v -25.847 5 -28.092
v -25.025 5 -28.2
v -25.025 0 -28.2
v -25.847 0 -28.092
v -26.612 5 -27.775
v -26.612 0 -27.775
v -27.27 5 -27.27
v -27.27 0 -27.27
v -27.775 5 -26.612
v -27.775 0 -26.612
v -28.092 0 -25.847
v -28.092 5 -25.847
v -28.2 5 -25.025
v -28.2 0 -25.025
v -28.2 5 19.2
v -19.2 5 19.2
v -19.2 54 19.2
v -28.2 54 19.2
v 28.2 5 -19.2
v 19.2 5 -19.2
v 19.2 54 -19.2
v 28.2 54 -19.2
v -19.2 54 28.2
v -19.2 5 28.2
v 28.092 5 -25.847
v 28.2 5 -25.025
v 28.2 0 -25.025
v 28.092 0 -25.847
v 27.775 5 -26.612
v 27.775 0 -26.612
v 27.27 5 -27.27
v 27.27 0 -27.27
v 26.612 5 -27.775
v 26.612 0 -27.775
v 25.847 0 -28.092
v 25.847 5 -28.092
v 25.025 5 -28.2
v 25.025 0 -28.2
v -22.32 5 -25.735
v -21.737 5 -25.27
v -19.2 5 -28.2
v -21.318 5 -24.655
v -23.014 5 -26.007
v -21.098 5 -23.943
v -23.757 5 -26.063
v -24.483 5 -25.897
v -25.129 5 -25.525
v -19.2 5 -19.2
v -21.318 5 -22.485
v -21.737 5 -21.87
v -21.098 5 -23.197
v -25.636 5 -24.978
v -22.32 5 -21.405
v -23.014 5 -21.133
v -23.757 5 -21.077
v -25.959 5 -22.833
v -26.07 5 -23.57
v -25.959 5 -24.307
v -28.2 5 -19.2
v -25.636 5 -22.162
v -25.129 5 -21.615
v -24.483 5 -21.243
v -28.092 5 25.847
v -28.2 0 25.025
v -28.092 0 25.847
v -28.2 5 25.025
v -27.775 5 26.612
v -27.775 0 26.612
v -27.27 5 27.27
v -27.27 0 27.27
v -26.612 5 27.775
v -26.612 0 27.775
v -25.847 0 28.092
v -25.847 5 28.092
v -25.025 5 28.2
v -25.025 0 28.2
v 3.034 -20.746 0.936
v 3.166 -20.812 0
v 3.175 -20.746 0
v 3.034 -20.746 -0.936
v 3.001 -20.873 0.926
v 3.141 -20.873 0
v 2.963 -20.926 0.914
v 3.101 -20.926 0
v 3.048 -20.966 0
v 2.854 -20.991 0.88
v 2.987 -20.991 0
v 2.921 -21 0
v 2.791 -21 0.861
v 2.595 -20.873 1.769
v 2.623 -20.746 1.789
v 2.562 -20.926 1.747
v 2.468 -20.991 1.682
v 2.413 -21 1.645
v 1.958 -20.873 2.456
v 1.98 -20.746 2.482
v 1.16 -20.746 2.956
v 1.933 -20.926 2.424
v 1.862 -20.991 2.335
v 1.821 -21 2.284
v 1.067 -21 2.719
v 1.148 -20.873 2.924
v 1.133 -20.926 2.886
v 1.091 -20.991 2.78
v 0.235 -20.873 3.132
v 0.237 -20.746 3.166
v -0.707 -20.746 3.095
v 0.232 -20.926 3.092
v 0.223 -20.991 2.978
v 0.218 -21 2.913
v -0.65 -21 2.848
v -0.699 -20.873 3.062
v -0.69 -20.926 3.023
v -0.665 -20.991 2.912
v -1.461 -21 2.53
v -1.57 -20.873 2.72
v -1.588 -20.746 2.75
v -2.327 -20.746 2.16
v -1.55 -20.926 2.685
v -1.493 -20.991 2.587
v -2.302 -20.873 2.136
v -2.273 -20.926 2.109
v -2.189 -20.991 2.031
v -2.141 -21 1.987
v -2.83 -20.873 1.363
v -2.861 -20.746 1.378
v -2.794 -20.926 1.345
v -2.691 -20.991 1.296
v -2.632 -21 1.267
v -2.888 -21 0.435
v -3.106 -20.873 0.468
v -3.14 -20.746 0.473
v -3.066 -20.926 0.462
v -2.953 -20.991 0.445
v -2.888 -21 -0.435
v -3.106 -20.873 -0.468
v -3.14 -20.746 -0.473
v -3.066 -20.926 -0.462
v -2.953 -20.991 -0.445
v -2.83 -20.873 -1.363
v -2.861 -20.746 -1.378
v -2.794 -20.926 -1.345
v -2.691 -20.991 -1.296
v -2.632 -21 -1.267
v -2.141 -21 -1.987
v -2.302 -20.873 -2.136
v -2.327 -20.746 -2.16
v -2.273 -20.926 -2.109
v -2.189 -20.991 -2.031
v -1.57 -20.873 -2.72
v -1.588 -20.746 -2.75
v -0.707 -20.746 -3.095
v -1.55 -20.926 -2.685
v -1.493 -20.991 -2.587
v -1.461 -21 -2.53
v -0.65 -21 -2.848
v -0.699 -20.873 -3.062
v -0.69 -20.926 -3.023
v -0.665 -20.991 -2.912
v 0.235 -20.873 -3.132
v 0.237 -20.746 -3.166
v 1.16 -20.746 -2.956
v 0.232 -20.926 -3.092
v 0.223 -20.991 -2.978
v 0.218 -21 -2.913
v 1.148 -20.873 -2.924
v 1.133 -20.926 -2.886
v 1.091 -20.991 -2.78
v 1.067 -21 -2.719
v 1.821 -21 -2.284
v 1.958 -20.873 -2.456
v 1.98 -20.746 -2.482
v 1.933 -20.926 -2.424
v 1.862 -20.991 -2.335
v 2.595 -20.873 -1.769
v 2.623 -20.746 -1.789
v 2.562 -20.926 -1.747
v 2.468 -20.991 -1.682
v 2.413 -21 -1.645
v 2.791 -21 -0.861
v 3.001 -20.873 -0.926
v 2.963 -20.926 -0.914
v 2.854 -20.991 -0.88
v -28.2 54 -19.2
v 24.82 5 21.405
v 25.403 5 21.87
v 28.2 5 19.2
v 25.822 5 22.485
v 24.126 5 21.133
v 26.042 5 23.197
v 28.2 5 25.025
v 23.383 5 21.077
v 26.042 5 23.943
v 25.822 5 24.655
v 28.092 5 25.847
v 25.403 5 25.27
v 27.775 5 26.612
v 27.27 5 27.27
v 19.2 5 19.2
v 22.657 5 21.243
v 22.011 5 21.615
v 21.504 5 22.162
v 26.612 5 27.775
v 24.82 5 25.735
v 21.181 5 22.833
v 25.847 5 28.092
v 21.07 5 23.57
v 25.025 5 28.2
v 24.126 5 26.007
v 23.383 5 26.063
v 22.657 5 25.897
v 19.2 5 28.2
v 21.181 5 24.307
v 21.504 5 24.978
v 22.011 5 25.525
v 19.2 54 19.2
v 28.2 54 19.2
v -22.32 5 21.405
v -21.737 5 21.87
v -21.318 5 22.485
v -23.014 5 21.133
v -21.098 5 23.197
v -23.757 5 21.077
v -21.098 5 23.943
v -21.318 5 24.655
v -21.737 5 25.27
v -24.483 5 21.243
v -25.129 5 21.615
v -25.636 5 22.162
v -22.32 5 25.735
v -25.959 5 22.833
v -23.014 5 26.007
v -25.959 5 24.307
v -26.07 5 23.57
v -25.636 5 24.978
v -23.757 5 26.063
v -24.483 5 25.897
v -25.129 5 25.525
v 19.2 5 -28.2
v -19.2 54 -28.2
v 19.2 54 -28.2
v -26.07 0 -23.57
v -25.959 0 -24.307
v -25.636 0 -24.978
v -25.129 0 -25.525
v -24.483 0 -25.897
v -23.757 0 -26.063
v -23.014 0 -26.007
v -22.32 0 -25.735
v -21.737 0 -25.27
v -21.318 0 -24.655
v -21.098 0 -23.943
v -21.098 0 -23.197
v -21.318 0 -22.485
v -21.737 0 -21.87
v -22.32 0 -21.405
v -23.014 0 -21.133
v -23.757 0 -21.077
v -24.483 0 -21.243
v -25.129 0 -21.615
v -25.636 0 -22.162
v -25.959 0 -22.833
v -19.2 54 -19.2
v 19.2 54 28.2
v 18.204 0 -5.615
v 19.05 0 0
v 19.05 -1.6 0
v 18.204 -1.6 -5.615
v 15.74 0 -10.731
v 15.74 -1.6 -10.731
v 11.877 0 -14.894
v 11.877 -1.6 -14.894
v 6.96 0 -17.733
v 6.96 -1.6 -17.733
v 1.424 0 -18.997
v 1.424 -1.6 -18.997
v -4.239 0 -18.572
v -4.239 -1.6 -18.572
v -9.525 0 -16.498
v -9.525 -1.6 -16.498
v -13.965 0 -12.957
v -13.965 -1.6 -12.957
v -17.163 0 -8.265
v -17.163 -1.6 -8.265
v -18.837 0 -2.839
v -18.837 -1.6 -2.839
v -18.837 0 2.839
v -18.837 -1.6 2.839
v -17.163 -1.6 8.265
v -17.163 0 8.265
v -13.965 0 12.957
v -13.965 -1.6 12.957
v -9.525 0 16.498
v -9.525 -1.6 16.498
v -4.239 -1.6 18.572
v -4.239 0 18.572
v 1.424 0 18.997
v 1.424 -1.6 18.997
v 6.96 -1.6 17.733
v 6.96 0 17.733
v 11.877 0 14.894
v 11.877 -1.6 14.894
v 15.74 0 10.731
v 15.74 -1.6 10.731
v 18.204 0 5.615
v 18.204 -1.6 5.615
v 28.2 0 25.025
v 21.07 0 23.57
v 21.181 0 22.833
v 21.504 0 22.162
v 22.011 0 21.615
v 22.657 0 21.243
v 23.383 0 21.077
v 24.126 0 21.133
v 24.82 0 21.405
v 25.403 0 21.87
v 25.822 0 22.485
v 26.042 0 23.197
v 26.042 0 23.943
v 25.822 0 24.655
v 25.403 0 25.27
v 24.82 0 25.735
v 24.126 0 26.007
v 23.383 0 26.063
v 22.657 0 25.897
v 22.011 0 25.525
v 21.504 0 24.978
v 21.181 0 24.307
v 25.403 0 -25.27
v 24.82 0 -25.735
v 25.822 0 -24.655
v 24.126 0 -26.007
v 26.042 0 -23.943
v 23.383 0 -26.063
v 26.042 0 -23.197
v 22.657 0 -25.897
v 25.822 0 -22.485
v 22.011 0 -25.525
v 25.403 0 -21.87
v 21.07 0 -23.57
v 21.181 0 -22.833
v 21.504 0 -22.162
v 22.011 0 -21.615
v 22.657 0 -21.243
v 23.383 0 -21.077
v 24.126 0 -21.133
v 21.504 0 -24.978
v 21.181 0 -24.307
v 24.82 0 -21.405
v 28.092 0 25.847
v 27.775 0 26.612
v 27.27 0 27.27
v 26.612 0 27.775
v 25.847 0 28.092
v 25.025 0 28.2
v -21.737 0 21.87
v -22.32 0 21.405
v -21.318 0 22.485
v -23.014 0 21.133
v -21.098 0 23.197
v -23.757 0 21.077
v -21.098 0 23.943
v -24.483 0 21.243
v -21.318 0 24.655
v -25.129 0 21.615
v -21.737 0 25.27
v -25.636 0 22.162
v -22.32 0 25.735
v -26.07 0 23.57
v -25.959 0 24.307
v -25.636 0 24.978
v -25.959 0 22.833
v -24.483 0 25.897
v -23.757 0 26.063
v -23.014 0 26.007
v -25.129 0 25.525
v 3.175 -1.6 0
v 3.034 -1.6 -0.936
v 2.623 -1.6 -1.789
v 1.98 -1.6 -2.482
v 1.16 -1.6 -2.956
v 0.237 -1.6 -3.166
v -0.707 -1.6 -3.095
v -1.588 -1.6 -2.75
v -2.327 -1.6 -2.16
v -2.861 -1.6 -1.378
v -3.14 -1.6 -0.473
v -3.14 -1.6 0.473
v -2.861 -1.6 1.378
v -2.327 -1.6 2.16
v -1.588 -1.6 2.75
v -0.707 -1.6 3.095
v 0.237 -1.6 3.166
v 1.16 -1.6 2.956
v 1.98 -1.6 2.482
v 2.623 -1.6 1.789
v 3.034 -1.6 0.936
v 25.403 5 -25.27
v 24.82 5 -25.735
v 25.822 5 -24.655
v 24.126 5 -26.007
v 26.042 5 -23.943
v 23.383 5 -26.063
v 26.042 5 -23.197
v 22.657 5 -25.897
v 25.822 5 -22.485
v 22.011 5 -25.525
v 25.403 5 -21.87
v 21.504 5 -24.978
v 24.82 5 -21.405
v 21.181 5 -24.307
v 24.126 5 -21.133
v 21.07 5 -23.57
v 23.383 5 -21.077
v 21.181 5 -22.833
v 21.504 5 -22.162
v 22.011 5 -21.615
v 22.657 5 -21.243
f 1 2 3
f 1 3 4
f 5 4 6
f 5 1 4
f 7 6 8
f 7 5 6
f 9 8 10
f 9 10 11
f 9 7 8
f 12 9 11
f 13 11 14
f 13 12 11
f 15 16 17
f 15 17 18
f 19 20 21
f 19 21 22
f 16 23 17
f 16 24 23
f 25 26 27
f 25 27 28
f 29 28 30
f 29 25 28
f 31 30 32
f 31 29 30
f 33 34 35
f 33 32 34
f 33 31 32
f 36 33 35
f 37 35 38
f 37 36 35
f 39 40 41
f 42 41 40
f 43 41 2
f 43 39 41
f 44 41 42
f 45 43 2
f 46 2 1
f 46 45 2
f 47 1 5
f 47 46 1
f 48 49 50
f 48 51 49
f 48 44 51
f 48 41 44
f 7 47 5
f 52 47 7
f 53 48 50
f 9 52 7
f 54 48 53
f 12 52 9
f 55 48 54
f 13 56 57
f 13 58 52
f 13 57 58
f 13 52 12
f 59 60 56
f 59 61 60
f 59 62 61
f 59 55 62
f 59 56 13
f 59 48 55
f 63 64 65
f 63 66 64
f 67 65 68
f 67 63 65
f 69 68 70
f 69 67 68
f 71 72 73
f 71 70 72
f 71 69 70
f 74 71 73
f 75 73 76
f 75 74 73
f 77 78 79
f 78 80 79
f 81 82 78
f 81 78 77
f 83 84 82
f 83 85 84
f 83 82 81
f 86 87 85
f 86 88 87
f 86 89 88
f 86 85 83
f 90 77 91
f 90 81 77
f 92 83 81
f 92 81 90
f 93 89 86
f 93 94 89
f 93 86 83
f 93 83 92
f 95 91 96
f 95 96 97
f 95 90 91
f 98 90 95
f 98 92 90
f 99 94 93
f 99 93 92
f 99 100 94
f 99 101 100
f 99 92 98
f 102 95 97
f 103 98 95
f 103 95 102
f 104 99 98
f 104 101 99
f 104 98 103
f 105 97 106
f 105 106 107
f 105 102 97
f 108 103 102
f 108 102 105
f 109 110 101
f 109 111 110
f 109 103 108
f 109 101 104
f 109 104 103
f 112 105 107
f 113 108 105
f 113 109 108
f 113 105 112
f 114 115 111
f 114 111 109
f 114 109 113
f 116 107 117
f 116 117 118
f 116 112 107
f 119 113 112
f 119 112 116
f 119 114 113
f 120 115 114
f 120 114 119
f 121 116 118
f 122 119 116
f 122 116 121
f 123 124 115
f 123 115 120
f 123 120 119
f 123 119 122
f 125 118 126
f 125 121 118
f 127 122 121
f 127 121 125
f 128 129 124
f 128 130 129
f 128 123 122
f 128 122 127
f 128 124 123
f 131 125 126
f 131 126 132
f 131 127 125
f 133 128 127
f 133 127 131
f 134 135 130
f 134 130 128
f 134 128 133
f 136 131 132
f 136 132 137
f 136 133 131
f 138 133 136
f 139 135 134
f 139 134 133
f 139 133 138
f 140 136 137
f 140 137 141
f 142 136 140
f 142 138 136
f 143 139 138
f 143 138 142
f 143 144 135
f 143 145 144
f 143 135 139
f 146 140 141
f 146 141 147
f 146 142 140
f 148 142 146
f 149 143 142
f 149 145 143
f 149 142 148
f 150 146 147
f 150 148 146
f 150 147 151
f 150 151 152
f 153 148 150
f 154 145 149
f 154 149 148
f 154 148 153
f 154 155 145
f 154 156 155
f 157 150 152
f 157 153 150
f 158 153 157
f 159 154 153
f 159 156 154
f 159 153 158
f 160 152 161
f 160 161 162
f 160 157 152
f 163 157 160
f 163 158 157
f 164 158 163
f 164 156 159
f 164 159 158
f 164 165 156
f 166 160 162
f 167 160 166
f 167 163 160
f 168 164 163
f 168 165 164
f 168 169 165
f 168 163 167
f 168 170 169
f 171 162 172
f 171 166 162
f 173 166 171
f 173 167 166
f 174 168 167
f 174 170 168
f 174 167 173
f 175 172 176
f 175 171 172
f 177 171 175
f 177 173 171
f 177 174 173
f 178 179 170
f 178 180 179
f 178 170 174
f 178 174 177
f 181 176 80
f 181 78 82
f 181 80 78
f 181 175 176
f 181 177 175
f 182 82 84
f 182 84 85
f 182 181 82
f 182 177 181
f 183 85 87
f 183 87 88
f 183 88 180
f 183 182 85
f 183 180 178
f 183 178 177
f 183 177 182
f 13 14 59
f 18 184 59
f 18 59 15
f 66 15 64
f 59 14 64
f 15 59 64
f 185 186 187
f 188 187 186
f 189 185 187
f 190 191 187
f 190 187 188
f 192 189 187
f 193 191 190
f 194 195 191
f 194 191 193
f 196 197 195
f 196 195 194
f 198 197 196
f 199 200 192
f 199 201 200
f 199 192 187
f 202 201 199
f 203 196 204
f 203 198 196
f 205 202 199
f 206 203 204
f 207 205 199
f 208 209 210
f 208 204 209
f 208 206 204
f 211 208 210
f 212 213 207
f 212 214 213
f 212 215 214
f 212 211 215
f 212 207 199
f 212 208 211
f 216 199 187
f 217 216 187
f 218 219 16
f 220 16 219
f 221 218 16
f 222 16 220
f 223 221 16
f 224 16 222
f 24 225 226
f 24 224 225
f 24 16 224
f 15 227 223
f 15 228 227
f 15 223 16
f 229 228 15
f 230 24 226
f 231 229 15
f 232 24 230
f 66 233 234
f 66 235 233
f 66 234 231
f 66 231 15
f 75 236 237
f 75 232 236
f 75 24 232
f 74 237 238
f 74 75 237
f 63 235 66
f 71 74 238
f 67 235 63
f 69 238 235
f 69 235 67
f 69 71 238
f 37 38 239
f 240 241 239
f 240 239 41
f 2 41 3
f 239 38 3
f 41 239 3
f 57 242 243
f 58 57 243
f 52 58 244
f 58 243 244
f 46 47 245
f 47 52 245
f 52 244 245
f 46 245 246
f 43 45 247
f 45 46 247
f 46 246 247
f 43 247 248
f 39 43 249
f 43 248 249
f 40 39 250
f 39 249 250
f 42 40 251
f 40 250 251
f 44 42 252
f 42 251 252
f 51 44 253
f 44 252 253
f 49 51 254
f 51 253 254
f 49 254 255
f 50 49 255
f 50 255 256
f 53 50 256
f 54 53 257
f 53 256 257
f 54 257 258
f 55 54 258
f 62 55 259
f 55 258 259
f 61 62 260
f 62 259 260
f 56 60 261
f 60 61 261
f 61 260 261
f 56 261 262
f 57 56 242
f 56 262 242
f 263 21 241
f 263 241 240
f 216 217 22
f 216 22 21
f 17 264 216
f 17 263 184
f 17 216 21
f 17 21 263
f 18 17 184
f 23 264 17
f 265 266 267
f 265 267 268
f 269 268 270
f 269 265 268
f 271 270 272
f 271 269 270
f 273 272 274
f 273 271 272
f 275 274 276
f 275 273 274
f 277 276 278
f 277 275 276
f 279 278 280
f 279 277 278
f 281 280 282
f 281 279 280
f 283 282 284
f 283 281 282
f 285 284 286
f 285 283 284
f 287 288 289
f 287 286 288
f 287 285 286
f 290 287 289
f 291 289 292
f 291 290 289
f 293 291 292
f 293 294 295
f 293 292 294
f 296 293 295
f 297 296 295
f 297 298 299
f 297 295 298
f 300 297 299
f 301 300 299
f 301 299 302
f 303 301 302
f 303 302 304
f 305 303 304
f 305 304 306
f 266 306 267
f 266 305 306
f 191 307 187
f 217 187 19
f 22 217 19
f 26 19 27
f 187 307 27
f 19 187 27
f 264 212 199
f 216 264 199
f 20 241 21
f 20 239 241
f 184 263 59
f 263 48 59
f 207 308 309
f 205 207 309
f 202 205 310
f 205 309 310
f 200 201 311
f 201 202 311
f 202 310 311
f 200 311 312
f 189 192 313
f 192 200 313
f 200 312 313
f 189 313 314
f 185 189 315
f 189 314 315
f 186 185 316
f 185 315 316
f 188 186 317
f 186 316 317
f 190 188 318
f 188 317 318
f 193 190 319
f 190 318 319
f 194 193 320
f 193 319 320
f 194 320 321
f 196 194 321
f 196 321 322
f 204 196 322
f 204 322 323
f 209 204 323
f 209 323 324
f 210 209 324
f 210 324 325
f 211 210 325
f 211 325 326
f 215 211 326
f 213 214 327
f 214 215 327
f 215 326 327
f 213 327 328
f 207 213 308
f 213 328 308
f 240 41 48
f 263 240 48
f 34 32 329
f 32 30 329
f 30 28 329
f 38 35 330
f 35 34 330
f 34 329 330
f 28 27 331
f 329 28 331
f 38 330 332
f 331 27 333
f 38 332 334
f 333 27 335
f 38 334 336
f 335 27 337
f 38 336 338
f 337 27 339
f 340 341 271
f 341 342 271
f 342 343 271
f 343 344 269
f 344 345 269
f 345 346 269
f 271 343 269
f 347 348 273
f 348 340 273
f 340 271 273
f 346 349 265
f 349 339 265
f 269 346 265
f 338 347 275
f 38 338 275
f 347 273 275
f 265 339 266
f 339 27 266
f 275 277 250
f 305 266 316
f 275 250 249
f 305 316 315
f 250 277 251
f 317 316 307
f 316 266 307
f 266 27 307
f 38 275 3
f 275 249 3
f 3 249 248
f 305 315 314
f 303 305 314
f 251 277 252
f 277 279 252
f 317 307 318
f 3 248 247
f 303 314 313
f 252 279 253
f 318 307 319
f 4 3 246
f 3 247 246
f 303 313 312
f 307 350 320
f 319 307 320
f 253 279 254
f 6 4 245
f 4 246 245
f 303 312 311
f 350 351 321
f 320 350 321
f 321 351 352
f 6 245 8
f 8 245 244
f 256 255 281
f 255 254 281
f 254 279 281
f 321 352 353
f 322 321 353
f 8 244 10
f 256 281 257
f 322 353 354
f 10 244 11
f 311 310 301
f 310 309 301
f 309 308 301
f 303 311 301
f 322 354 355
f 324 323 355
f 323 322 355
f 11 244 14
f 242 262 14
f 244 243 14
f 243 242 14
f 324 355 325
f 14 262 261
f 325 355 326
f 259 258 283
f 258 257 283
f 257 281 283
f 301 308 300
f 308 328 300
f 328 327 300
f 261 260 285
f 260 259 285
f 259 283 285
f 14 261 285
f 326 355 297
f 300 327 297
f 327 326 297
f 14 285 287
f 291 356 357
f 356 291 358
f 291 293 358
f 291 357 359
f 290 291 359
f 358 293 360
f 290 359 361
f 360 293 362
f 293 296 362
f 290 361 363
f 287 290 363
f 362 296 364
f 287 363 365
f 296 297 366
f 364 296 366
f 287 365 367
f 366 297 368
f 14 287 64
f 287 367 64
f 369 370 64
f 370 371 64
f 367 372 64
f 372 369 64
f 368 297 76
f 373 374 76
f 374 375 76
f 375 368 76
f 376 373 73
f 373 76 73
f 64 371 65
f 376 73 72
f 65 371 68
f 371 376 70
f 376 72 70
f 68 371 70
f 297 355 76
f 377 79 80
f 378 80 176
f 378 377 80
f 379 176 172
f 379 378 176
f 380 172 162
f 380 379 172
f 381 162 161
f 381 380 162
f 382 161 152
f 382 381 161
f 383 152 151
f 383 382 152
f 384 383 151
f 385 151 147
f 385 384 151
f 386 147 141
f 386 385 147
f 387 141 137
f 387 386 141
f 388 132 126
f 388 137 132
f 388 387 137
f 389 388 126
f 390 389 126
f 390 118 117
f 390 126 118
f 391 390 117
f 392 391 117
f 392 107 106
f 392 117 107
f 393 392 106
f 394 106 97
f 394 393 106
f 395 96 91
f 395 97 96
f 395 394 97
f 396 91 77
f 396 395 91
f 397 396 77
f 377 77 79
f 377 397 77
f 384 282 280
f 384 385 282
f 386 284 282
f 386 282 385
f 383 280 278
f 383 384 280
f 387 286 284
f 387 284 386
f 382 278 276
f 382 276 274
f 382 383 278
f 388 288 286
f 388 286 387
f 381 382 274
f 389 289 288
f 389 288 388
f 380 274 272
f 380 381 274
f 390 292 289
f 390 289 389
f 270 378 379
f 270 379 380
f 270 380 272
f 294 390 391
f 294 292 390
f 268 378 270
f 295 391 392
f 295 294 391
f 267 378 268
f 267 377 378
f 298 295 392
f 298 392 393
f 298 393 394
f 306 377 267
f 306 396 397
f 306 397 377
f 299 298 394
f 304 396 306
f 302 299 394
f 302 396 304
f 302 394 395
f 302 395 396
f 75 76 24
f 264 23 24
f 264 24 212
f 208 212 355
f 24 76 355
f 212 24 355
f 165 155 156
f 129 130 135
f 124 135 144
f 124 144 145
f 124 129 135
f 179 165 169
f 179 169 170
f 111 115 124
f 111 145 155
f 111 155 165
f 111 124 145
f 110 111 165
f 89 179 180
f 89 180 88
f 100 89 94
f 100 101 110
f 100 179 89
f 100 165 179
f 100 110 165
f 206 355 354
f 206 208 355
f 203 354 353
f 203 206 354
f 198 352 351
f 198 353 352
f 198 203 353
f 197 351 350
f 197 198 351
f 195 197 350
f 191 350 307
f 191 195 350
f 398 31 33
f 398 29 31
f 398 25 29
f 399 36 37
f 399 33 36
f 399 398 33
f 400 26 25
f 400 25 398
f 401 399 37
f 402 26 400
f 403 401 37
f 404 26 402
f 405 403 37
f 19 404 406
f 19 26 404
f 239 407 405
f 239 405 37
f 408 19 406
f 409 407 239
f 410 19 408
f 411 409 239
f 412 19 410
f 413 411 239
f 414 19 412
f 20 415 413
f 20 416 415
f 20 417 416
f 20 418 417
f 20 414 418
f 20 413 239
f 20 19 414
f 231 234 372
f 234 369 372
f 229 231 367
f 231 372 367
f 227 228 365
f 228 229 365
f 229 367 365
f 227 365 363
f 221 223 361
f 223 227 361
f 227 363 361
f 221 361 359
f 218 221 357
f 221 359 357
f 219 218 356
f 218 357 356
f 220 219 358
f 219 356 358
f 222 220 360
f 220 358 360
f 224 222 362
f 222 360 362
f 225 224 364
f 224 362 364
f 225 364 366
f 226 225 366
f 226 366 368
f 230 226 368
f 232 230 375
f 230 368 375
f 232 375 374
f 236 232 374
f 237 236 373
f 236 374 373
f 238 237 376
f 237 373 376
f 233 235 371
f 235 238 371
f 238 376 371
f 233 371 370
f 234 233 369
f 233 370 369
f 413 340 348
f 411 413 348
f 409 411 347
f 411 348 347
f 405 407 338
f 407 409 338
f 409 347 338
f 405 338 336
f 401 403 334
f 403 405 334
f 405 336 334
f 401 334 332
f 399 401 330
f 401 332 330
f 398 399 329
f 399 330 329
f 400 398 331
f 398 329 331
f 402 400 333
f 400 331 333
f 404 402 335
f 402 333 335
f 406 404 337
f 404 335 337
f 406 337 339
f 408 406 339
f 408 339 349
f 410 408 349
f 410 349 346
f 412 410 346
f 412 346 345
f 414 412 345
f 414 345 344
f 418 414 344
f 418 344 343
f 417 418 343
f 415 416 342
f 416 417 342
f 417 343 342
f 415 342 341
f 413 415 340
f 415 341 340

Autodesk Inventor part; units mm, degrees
ref_plane "YZ Plane" through (0, 0, 0) normal (1, 0, 0) x (0, 1, 0)
ref_plane "XZ Plane" through (0, 0, 0) normal (0, 1, 0) x (-1, 0, 0)
ref_plane "XY Plane" through (0, 0, 0) normal (0, 0, 1) x (1, 0, 0)
sketch "Sketch1" plane through (0, 0, 0) normal (0, 1, 0) x (-1, 0, 0)
  line L0 (-28.2, -28.2) -> (28.2, -28.2)
  line L1 (28.2, -28.2) -> (28.2, 28.2)
  line L2 (28.2, 28.2) -> (-28.2, 28.2)
  line L3 (-28.2, 28.2) -> (-28.2, -28.2)
  line L4 (-28.2, -28.2) -> (28.2, 28.2) construction
  line L5 (28.2, -28.2) -> (-28.2, 28.2) construction
  line L6 (28.2, 28.2) -> (19.2, 28.2)
  line L7 (19.2, 28.2) -> (19.2, 19.2)
  line L8 (19.2, 19.2) -> (28.2, 19.2)
  line L9 (28.2, 19.2) -> (28.2, 28.2)
  line L10 (15.7012, 0) -> (-14.7312, 0)
  line L11 (0, 21.5613) -> (0, -24.5212)
  line L12 (28.2, -28.2) -> (19.2, -28.2)
  line L13 (19.2, -28.2) -> (19.2, -19.2)
  line L14 (19.2, -19.2) -> (28.2, -19.2)
  line L15 (28.2, -19.2) -> (28.2, -28.2)
  line L16 (-28.2, 28.2) -> (-19.2, 28.2)
  line L17 (-19.2, 28.2) -> (-19.2, 19.2)
  line L18 (-19.2, 19.2) -> (-28.2, 19.2)
  line L19 (-28.2, 19.2) -> (-28.2, 28.2)
  line L20 (-28.2, -28.2) -> (-19.2, -28.2)
  line L21 (-19.2, -28.2) -> (-19.2, -19.2)
  line L22 (-19.2, -19.2) -> (-28.2, -19.2)
  line L23 (-28.2, -19.2) -> (-28.2, -28.2)
  circle A0 centre (23.57, 23.57) radius 2.5
  circle A1 centre (23.57, -23.57) radius 2.5
  circle A2 centre (-23.57, 23.57) radius 2.5
  circle A3 centre (-23.57, -23.57) radius 2.5
  point P0 (0, 0)
  point P1 (0, 0)
  point P2 (0, 0)
  dimension "d0" = 56.4
  dimension "d1" = 56.4
  dimension "d2" = 9
  dimension "d3" = 9
  dimension "d6" = 47.14
  dimension "d7" = 47.14
  dimension "d8" = 5
extrude "Extrusion1" add sketch "Sketch1" along normal blind 54 contours L21 L22 L3 L18 L17 L2 L7 L8 L1 L14 L13 L0
extrude "Extrusion2" add sketch "Sketch1" along normal blind 5 contours L3 L22 L21 L0 | L13 L14 L1 L0 | L3 L2 L17 L18 | L8 L7 L2 L1
fillet "Fillet1" radius 3.175 4 edges at (-28.2, 2.5, 28.2) (-28.2, 2.5, -28.2) (28.2, 2.5, -28.2) (28.2, 2.5, 28.2)
sketch "Sketch2" plane through (0, 0, 0) normal (0, -1, 0) x (1, 0, 0)
  circle A0 centre (0, 0) radius 19.05
  dimension "d12" = 38.1
extrude "Extrusion3" add sketch "Sketch2" along normal blind 1.6
sketch "Sketch3" plane through (0, 0, 0) normal (0, -1, 0) x (1, 0, 0)
  circle A0 centre (0, 0) radius 3.175
  dimension "d15" = 6.35
extrude "Extrusion4" add sketch "Sketch3" along normal blind 21
fillet "Fillet2" radius 0.254 1 edges at (-3.175, -21, 0)
equation "\"d1\" = d0"
equation "\"d3\" = d2"
equation "\"d7\" = d6"
properties part number "Stepper_Motor_Large"
